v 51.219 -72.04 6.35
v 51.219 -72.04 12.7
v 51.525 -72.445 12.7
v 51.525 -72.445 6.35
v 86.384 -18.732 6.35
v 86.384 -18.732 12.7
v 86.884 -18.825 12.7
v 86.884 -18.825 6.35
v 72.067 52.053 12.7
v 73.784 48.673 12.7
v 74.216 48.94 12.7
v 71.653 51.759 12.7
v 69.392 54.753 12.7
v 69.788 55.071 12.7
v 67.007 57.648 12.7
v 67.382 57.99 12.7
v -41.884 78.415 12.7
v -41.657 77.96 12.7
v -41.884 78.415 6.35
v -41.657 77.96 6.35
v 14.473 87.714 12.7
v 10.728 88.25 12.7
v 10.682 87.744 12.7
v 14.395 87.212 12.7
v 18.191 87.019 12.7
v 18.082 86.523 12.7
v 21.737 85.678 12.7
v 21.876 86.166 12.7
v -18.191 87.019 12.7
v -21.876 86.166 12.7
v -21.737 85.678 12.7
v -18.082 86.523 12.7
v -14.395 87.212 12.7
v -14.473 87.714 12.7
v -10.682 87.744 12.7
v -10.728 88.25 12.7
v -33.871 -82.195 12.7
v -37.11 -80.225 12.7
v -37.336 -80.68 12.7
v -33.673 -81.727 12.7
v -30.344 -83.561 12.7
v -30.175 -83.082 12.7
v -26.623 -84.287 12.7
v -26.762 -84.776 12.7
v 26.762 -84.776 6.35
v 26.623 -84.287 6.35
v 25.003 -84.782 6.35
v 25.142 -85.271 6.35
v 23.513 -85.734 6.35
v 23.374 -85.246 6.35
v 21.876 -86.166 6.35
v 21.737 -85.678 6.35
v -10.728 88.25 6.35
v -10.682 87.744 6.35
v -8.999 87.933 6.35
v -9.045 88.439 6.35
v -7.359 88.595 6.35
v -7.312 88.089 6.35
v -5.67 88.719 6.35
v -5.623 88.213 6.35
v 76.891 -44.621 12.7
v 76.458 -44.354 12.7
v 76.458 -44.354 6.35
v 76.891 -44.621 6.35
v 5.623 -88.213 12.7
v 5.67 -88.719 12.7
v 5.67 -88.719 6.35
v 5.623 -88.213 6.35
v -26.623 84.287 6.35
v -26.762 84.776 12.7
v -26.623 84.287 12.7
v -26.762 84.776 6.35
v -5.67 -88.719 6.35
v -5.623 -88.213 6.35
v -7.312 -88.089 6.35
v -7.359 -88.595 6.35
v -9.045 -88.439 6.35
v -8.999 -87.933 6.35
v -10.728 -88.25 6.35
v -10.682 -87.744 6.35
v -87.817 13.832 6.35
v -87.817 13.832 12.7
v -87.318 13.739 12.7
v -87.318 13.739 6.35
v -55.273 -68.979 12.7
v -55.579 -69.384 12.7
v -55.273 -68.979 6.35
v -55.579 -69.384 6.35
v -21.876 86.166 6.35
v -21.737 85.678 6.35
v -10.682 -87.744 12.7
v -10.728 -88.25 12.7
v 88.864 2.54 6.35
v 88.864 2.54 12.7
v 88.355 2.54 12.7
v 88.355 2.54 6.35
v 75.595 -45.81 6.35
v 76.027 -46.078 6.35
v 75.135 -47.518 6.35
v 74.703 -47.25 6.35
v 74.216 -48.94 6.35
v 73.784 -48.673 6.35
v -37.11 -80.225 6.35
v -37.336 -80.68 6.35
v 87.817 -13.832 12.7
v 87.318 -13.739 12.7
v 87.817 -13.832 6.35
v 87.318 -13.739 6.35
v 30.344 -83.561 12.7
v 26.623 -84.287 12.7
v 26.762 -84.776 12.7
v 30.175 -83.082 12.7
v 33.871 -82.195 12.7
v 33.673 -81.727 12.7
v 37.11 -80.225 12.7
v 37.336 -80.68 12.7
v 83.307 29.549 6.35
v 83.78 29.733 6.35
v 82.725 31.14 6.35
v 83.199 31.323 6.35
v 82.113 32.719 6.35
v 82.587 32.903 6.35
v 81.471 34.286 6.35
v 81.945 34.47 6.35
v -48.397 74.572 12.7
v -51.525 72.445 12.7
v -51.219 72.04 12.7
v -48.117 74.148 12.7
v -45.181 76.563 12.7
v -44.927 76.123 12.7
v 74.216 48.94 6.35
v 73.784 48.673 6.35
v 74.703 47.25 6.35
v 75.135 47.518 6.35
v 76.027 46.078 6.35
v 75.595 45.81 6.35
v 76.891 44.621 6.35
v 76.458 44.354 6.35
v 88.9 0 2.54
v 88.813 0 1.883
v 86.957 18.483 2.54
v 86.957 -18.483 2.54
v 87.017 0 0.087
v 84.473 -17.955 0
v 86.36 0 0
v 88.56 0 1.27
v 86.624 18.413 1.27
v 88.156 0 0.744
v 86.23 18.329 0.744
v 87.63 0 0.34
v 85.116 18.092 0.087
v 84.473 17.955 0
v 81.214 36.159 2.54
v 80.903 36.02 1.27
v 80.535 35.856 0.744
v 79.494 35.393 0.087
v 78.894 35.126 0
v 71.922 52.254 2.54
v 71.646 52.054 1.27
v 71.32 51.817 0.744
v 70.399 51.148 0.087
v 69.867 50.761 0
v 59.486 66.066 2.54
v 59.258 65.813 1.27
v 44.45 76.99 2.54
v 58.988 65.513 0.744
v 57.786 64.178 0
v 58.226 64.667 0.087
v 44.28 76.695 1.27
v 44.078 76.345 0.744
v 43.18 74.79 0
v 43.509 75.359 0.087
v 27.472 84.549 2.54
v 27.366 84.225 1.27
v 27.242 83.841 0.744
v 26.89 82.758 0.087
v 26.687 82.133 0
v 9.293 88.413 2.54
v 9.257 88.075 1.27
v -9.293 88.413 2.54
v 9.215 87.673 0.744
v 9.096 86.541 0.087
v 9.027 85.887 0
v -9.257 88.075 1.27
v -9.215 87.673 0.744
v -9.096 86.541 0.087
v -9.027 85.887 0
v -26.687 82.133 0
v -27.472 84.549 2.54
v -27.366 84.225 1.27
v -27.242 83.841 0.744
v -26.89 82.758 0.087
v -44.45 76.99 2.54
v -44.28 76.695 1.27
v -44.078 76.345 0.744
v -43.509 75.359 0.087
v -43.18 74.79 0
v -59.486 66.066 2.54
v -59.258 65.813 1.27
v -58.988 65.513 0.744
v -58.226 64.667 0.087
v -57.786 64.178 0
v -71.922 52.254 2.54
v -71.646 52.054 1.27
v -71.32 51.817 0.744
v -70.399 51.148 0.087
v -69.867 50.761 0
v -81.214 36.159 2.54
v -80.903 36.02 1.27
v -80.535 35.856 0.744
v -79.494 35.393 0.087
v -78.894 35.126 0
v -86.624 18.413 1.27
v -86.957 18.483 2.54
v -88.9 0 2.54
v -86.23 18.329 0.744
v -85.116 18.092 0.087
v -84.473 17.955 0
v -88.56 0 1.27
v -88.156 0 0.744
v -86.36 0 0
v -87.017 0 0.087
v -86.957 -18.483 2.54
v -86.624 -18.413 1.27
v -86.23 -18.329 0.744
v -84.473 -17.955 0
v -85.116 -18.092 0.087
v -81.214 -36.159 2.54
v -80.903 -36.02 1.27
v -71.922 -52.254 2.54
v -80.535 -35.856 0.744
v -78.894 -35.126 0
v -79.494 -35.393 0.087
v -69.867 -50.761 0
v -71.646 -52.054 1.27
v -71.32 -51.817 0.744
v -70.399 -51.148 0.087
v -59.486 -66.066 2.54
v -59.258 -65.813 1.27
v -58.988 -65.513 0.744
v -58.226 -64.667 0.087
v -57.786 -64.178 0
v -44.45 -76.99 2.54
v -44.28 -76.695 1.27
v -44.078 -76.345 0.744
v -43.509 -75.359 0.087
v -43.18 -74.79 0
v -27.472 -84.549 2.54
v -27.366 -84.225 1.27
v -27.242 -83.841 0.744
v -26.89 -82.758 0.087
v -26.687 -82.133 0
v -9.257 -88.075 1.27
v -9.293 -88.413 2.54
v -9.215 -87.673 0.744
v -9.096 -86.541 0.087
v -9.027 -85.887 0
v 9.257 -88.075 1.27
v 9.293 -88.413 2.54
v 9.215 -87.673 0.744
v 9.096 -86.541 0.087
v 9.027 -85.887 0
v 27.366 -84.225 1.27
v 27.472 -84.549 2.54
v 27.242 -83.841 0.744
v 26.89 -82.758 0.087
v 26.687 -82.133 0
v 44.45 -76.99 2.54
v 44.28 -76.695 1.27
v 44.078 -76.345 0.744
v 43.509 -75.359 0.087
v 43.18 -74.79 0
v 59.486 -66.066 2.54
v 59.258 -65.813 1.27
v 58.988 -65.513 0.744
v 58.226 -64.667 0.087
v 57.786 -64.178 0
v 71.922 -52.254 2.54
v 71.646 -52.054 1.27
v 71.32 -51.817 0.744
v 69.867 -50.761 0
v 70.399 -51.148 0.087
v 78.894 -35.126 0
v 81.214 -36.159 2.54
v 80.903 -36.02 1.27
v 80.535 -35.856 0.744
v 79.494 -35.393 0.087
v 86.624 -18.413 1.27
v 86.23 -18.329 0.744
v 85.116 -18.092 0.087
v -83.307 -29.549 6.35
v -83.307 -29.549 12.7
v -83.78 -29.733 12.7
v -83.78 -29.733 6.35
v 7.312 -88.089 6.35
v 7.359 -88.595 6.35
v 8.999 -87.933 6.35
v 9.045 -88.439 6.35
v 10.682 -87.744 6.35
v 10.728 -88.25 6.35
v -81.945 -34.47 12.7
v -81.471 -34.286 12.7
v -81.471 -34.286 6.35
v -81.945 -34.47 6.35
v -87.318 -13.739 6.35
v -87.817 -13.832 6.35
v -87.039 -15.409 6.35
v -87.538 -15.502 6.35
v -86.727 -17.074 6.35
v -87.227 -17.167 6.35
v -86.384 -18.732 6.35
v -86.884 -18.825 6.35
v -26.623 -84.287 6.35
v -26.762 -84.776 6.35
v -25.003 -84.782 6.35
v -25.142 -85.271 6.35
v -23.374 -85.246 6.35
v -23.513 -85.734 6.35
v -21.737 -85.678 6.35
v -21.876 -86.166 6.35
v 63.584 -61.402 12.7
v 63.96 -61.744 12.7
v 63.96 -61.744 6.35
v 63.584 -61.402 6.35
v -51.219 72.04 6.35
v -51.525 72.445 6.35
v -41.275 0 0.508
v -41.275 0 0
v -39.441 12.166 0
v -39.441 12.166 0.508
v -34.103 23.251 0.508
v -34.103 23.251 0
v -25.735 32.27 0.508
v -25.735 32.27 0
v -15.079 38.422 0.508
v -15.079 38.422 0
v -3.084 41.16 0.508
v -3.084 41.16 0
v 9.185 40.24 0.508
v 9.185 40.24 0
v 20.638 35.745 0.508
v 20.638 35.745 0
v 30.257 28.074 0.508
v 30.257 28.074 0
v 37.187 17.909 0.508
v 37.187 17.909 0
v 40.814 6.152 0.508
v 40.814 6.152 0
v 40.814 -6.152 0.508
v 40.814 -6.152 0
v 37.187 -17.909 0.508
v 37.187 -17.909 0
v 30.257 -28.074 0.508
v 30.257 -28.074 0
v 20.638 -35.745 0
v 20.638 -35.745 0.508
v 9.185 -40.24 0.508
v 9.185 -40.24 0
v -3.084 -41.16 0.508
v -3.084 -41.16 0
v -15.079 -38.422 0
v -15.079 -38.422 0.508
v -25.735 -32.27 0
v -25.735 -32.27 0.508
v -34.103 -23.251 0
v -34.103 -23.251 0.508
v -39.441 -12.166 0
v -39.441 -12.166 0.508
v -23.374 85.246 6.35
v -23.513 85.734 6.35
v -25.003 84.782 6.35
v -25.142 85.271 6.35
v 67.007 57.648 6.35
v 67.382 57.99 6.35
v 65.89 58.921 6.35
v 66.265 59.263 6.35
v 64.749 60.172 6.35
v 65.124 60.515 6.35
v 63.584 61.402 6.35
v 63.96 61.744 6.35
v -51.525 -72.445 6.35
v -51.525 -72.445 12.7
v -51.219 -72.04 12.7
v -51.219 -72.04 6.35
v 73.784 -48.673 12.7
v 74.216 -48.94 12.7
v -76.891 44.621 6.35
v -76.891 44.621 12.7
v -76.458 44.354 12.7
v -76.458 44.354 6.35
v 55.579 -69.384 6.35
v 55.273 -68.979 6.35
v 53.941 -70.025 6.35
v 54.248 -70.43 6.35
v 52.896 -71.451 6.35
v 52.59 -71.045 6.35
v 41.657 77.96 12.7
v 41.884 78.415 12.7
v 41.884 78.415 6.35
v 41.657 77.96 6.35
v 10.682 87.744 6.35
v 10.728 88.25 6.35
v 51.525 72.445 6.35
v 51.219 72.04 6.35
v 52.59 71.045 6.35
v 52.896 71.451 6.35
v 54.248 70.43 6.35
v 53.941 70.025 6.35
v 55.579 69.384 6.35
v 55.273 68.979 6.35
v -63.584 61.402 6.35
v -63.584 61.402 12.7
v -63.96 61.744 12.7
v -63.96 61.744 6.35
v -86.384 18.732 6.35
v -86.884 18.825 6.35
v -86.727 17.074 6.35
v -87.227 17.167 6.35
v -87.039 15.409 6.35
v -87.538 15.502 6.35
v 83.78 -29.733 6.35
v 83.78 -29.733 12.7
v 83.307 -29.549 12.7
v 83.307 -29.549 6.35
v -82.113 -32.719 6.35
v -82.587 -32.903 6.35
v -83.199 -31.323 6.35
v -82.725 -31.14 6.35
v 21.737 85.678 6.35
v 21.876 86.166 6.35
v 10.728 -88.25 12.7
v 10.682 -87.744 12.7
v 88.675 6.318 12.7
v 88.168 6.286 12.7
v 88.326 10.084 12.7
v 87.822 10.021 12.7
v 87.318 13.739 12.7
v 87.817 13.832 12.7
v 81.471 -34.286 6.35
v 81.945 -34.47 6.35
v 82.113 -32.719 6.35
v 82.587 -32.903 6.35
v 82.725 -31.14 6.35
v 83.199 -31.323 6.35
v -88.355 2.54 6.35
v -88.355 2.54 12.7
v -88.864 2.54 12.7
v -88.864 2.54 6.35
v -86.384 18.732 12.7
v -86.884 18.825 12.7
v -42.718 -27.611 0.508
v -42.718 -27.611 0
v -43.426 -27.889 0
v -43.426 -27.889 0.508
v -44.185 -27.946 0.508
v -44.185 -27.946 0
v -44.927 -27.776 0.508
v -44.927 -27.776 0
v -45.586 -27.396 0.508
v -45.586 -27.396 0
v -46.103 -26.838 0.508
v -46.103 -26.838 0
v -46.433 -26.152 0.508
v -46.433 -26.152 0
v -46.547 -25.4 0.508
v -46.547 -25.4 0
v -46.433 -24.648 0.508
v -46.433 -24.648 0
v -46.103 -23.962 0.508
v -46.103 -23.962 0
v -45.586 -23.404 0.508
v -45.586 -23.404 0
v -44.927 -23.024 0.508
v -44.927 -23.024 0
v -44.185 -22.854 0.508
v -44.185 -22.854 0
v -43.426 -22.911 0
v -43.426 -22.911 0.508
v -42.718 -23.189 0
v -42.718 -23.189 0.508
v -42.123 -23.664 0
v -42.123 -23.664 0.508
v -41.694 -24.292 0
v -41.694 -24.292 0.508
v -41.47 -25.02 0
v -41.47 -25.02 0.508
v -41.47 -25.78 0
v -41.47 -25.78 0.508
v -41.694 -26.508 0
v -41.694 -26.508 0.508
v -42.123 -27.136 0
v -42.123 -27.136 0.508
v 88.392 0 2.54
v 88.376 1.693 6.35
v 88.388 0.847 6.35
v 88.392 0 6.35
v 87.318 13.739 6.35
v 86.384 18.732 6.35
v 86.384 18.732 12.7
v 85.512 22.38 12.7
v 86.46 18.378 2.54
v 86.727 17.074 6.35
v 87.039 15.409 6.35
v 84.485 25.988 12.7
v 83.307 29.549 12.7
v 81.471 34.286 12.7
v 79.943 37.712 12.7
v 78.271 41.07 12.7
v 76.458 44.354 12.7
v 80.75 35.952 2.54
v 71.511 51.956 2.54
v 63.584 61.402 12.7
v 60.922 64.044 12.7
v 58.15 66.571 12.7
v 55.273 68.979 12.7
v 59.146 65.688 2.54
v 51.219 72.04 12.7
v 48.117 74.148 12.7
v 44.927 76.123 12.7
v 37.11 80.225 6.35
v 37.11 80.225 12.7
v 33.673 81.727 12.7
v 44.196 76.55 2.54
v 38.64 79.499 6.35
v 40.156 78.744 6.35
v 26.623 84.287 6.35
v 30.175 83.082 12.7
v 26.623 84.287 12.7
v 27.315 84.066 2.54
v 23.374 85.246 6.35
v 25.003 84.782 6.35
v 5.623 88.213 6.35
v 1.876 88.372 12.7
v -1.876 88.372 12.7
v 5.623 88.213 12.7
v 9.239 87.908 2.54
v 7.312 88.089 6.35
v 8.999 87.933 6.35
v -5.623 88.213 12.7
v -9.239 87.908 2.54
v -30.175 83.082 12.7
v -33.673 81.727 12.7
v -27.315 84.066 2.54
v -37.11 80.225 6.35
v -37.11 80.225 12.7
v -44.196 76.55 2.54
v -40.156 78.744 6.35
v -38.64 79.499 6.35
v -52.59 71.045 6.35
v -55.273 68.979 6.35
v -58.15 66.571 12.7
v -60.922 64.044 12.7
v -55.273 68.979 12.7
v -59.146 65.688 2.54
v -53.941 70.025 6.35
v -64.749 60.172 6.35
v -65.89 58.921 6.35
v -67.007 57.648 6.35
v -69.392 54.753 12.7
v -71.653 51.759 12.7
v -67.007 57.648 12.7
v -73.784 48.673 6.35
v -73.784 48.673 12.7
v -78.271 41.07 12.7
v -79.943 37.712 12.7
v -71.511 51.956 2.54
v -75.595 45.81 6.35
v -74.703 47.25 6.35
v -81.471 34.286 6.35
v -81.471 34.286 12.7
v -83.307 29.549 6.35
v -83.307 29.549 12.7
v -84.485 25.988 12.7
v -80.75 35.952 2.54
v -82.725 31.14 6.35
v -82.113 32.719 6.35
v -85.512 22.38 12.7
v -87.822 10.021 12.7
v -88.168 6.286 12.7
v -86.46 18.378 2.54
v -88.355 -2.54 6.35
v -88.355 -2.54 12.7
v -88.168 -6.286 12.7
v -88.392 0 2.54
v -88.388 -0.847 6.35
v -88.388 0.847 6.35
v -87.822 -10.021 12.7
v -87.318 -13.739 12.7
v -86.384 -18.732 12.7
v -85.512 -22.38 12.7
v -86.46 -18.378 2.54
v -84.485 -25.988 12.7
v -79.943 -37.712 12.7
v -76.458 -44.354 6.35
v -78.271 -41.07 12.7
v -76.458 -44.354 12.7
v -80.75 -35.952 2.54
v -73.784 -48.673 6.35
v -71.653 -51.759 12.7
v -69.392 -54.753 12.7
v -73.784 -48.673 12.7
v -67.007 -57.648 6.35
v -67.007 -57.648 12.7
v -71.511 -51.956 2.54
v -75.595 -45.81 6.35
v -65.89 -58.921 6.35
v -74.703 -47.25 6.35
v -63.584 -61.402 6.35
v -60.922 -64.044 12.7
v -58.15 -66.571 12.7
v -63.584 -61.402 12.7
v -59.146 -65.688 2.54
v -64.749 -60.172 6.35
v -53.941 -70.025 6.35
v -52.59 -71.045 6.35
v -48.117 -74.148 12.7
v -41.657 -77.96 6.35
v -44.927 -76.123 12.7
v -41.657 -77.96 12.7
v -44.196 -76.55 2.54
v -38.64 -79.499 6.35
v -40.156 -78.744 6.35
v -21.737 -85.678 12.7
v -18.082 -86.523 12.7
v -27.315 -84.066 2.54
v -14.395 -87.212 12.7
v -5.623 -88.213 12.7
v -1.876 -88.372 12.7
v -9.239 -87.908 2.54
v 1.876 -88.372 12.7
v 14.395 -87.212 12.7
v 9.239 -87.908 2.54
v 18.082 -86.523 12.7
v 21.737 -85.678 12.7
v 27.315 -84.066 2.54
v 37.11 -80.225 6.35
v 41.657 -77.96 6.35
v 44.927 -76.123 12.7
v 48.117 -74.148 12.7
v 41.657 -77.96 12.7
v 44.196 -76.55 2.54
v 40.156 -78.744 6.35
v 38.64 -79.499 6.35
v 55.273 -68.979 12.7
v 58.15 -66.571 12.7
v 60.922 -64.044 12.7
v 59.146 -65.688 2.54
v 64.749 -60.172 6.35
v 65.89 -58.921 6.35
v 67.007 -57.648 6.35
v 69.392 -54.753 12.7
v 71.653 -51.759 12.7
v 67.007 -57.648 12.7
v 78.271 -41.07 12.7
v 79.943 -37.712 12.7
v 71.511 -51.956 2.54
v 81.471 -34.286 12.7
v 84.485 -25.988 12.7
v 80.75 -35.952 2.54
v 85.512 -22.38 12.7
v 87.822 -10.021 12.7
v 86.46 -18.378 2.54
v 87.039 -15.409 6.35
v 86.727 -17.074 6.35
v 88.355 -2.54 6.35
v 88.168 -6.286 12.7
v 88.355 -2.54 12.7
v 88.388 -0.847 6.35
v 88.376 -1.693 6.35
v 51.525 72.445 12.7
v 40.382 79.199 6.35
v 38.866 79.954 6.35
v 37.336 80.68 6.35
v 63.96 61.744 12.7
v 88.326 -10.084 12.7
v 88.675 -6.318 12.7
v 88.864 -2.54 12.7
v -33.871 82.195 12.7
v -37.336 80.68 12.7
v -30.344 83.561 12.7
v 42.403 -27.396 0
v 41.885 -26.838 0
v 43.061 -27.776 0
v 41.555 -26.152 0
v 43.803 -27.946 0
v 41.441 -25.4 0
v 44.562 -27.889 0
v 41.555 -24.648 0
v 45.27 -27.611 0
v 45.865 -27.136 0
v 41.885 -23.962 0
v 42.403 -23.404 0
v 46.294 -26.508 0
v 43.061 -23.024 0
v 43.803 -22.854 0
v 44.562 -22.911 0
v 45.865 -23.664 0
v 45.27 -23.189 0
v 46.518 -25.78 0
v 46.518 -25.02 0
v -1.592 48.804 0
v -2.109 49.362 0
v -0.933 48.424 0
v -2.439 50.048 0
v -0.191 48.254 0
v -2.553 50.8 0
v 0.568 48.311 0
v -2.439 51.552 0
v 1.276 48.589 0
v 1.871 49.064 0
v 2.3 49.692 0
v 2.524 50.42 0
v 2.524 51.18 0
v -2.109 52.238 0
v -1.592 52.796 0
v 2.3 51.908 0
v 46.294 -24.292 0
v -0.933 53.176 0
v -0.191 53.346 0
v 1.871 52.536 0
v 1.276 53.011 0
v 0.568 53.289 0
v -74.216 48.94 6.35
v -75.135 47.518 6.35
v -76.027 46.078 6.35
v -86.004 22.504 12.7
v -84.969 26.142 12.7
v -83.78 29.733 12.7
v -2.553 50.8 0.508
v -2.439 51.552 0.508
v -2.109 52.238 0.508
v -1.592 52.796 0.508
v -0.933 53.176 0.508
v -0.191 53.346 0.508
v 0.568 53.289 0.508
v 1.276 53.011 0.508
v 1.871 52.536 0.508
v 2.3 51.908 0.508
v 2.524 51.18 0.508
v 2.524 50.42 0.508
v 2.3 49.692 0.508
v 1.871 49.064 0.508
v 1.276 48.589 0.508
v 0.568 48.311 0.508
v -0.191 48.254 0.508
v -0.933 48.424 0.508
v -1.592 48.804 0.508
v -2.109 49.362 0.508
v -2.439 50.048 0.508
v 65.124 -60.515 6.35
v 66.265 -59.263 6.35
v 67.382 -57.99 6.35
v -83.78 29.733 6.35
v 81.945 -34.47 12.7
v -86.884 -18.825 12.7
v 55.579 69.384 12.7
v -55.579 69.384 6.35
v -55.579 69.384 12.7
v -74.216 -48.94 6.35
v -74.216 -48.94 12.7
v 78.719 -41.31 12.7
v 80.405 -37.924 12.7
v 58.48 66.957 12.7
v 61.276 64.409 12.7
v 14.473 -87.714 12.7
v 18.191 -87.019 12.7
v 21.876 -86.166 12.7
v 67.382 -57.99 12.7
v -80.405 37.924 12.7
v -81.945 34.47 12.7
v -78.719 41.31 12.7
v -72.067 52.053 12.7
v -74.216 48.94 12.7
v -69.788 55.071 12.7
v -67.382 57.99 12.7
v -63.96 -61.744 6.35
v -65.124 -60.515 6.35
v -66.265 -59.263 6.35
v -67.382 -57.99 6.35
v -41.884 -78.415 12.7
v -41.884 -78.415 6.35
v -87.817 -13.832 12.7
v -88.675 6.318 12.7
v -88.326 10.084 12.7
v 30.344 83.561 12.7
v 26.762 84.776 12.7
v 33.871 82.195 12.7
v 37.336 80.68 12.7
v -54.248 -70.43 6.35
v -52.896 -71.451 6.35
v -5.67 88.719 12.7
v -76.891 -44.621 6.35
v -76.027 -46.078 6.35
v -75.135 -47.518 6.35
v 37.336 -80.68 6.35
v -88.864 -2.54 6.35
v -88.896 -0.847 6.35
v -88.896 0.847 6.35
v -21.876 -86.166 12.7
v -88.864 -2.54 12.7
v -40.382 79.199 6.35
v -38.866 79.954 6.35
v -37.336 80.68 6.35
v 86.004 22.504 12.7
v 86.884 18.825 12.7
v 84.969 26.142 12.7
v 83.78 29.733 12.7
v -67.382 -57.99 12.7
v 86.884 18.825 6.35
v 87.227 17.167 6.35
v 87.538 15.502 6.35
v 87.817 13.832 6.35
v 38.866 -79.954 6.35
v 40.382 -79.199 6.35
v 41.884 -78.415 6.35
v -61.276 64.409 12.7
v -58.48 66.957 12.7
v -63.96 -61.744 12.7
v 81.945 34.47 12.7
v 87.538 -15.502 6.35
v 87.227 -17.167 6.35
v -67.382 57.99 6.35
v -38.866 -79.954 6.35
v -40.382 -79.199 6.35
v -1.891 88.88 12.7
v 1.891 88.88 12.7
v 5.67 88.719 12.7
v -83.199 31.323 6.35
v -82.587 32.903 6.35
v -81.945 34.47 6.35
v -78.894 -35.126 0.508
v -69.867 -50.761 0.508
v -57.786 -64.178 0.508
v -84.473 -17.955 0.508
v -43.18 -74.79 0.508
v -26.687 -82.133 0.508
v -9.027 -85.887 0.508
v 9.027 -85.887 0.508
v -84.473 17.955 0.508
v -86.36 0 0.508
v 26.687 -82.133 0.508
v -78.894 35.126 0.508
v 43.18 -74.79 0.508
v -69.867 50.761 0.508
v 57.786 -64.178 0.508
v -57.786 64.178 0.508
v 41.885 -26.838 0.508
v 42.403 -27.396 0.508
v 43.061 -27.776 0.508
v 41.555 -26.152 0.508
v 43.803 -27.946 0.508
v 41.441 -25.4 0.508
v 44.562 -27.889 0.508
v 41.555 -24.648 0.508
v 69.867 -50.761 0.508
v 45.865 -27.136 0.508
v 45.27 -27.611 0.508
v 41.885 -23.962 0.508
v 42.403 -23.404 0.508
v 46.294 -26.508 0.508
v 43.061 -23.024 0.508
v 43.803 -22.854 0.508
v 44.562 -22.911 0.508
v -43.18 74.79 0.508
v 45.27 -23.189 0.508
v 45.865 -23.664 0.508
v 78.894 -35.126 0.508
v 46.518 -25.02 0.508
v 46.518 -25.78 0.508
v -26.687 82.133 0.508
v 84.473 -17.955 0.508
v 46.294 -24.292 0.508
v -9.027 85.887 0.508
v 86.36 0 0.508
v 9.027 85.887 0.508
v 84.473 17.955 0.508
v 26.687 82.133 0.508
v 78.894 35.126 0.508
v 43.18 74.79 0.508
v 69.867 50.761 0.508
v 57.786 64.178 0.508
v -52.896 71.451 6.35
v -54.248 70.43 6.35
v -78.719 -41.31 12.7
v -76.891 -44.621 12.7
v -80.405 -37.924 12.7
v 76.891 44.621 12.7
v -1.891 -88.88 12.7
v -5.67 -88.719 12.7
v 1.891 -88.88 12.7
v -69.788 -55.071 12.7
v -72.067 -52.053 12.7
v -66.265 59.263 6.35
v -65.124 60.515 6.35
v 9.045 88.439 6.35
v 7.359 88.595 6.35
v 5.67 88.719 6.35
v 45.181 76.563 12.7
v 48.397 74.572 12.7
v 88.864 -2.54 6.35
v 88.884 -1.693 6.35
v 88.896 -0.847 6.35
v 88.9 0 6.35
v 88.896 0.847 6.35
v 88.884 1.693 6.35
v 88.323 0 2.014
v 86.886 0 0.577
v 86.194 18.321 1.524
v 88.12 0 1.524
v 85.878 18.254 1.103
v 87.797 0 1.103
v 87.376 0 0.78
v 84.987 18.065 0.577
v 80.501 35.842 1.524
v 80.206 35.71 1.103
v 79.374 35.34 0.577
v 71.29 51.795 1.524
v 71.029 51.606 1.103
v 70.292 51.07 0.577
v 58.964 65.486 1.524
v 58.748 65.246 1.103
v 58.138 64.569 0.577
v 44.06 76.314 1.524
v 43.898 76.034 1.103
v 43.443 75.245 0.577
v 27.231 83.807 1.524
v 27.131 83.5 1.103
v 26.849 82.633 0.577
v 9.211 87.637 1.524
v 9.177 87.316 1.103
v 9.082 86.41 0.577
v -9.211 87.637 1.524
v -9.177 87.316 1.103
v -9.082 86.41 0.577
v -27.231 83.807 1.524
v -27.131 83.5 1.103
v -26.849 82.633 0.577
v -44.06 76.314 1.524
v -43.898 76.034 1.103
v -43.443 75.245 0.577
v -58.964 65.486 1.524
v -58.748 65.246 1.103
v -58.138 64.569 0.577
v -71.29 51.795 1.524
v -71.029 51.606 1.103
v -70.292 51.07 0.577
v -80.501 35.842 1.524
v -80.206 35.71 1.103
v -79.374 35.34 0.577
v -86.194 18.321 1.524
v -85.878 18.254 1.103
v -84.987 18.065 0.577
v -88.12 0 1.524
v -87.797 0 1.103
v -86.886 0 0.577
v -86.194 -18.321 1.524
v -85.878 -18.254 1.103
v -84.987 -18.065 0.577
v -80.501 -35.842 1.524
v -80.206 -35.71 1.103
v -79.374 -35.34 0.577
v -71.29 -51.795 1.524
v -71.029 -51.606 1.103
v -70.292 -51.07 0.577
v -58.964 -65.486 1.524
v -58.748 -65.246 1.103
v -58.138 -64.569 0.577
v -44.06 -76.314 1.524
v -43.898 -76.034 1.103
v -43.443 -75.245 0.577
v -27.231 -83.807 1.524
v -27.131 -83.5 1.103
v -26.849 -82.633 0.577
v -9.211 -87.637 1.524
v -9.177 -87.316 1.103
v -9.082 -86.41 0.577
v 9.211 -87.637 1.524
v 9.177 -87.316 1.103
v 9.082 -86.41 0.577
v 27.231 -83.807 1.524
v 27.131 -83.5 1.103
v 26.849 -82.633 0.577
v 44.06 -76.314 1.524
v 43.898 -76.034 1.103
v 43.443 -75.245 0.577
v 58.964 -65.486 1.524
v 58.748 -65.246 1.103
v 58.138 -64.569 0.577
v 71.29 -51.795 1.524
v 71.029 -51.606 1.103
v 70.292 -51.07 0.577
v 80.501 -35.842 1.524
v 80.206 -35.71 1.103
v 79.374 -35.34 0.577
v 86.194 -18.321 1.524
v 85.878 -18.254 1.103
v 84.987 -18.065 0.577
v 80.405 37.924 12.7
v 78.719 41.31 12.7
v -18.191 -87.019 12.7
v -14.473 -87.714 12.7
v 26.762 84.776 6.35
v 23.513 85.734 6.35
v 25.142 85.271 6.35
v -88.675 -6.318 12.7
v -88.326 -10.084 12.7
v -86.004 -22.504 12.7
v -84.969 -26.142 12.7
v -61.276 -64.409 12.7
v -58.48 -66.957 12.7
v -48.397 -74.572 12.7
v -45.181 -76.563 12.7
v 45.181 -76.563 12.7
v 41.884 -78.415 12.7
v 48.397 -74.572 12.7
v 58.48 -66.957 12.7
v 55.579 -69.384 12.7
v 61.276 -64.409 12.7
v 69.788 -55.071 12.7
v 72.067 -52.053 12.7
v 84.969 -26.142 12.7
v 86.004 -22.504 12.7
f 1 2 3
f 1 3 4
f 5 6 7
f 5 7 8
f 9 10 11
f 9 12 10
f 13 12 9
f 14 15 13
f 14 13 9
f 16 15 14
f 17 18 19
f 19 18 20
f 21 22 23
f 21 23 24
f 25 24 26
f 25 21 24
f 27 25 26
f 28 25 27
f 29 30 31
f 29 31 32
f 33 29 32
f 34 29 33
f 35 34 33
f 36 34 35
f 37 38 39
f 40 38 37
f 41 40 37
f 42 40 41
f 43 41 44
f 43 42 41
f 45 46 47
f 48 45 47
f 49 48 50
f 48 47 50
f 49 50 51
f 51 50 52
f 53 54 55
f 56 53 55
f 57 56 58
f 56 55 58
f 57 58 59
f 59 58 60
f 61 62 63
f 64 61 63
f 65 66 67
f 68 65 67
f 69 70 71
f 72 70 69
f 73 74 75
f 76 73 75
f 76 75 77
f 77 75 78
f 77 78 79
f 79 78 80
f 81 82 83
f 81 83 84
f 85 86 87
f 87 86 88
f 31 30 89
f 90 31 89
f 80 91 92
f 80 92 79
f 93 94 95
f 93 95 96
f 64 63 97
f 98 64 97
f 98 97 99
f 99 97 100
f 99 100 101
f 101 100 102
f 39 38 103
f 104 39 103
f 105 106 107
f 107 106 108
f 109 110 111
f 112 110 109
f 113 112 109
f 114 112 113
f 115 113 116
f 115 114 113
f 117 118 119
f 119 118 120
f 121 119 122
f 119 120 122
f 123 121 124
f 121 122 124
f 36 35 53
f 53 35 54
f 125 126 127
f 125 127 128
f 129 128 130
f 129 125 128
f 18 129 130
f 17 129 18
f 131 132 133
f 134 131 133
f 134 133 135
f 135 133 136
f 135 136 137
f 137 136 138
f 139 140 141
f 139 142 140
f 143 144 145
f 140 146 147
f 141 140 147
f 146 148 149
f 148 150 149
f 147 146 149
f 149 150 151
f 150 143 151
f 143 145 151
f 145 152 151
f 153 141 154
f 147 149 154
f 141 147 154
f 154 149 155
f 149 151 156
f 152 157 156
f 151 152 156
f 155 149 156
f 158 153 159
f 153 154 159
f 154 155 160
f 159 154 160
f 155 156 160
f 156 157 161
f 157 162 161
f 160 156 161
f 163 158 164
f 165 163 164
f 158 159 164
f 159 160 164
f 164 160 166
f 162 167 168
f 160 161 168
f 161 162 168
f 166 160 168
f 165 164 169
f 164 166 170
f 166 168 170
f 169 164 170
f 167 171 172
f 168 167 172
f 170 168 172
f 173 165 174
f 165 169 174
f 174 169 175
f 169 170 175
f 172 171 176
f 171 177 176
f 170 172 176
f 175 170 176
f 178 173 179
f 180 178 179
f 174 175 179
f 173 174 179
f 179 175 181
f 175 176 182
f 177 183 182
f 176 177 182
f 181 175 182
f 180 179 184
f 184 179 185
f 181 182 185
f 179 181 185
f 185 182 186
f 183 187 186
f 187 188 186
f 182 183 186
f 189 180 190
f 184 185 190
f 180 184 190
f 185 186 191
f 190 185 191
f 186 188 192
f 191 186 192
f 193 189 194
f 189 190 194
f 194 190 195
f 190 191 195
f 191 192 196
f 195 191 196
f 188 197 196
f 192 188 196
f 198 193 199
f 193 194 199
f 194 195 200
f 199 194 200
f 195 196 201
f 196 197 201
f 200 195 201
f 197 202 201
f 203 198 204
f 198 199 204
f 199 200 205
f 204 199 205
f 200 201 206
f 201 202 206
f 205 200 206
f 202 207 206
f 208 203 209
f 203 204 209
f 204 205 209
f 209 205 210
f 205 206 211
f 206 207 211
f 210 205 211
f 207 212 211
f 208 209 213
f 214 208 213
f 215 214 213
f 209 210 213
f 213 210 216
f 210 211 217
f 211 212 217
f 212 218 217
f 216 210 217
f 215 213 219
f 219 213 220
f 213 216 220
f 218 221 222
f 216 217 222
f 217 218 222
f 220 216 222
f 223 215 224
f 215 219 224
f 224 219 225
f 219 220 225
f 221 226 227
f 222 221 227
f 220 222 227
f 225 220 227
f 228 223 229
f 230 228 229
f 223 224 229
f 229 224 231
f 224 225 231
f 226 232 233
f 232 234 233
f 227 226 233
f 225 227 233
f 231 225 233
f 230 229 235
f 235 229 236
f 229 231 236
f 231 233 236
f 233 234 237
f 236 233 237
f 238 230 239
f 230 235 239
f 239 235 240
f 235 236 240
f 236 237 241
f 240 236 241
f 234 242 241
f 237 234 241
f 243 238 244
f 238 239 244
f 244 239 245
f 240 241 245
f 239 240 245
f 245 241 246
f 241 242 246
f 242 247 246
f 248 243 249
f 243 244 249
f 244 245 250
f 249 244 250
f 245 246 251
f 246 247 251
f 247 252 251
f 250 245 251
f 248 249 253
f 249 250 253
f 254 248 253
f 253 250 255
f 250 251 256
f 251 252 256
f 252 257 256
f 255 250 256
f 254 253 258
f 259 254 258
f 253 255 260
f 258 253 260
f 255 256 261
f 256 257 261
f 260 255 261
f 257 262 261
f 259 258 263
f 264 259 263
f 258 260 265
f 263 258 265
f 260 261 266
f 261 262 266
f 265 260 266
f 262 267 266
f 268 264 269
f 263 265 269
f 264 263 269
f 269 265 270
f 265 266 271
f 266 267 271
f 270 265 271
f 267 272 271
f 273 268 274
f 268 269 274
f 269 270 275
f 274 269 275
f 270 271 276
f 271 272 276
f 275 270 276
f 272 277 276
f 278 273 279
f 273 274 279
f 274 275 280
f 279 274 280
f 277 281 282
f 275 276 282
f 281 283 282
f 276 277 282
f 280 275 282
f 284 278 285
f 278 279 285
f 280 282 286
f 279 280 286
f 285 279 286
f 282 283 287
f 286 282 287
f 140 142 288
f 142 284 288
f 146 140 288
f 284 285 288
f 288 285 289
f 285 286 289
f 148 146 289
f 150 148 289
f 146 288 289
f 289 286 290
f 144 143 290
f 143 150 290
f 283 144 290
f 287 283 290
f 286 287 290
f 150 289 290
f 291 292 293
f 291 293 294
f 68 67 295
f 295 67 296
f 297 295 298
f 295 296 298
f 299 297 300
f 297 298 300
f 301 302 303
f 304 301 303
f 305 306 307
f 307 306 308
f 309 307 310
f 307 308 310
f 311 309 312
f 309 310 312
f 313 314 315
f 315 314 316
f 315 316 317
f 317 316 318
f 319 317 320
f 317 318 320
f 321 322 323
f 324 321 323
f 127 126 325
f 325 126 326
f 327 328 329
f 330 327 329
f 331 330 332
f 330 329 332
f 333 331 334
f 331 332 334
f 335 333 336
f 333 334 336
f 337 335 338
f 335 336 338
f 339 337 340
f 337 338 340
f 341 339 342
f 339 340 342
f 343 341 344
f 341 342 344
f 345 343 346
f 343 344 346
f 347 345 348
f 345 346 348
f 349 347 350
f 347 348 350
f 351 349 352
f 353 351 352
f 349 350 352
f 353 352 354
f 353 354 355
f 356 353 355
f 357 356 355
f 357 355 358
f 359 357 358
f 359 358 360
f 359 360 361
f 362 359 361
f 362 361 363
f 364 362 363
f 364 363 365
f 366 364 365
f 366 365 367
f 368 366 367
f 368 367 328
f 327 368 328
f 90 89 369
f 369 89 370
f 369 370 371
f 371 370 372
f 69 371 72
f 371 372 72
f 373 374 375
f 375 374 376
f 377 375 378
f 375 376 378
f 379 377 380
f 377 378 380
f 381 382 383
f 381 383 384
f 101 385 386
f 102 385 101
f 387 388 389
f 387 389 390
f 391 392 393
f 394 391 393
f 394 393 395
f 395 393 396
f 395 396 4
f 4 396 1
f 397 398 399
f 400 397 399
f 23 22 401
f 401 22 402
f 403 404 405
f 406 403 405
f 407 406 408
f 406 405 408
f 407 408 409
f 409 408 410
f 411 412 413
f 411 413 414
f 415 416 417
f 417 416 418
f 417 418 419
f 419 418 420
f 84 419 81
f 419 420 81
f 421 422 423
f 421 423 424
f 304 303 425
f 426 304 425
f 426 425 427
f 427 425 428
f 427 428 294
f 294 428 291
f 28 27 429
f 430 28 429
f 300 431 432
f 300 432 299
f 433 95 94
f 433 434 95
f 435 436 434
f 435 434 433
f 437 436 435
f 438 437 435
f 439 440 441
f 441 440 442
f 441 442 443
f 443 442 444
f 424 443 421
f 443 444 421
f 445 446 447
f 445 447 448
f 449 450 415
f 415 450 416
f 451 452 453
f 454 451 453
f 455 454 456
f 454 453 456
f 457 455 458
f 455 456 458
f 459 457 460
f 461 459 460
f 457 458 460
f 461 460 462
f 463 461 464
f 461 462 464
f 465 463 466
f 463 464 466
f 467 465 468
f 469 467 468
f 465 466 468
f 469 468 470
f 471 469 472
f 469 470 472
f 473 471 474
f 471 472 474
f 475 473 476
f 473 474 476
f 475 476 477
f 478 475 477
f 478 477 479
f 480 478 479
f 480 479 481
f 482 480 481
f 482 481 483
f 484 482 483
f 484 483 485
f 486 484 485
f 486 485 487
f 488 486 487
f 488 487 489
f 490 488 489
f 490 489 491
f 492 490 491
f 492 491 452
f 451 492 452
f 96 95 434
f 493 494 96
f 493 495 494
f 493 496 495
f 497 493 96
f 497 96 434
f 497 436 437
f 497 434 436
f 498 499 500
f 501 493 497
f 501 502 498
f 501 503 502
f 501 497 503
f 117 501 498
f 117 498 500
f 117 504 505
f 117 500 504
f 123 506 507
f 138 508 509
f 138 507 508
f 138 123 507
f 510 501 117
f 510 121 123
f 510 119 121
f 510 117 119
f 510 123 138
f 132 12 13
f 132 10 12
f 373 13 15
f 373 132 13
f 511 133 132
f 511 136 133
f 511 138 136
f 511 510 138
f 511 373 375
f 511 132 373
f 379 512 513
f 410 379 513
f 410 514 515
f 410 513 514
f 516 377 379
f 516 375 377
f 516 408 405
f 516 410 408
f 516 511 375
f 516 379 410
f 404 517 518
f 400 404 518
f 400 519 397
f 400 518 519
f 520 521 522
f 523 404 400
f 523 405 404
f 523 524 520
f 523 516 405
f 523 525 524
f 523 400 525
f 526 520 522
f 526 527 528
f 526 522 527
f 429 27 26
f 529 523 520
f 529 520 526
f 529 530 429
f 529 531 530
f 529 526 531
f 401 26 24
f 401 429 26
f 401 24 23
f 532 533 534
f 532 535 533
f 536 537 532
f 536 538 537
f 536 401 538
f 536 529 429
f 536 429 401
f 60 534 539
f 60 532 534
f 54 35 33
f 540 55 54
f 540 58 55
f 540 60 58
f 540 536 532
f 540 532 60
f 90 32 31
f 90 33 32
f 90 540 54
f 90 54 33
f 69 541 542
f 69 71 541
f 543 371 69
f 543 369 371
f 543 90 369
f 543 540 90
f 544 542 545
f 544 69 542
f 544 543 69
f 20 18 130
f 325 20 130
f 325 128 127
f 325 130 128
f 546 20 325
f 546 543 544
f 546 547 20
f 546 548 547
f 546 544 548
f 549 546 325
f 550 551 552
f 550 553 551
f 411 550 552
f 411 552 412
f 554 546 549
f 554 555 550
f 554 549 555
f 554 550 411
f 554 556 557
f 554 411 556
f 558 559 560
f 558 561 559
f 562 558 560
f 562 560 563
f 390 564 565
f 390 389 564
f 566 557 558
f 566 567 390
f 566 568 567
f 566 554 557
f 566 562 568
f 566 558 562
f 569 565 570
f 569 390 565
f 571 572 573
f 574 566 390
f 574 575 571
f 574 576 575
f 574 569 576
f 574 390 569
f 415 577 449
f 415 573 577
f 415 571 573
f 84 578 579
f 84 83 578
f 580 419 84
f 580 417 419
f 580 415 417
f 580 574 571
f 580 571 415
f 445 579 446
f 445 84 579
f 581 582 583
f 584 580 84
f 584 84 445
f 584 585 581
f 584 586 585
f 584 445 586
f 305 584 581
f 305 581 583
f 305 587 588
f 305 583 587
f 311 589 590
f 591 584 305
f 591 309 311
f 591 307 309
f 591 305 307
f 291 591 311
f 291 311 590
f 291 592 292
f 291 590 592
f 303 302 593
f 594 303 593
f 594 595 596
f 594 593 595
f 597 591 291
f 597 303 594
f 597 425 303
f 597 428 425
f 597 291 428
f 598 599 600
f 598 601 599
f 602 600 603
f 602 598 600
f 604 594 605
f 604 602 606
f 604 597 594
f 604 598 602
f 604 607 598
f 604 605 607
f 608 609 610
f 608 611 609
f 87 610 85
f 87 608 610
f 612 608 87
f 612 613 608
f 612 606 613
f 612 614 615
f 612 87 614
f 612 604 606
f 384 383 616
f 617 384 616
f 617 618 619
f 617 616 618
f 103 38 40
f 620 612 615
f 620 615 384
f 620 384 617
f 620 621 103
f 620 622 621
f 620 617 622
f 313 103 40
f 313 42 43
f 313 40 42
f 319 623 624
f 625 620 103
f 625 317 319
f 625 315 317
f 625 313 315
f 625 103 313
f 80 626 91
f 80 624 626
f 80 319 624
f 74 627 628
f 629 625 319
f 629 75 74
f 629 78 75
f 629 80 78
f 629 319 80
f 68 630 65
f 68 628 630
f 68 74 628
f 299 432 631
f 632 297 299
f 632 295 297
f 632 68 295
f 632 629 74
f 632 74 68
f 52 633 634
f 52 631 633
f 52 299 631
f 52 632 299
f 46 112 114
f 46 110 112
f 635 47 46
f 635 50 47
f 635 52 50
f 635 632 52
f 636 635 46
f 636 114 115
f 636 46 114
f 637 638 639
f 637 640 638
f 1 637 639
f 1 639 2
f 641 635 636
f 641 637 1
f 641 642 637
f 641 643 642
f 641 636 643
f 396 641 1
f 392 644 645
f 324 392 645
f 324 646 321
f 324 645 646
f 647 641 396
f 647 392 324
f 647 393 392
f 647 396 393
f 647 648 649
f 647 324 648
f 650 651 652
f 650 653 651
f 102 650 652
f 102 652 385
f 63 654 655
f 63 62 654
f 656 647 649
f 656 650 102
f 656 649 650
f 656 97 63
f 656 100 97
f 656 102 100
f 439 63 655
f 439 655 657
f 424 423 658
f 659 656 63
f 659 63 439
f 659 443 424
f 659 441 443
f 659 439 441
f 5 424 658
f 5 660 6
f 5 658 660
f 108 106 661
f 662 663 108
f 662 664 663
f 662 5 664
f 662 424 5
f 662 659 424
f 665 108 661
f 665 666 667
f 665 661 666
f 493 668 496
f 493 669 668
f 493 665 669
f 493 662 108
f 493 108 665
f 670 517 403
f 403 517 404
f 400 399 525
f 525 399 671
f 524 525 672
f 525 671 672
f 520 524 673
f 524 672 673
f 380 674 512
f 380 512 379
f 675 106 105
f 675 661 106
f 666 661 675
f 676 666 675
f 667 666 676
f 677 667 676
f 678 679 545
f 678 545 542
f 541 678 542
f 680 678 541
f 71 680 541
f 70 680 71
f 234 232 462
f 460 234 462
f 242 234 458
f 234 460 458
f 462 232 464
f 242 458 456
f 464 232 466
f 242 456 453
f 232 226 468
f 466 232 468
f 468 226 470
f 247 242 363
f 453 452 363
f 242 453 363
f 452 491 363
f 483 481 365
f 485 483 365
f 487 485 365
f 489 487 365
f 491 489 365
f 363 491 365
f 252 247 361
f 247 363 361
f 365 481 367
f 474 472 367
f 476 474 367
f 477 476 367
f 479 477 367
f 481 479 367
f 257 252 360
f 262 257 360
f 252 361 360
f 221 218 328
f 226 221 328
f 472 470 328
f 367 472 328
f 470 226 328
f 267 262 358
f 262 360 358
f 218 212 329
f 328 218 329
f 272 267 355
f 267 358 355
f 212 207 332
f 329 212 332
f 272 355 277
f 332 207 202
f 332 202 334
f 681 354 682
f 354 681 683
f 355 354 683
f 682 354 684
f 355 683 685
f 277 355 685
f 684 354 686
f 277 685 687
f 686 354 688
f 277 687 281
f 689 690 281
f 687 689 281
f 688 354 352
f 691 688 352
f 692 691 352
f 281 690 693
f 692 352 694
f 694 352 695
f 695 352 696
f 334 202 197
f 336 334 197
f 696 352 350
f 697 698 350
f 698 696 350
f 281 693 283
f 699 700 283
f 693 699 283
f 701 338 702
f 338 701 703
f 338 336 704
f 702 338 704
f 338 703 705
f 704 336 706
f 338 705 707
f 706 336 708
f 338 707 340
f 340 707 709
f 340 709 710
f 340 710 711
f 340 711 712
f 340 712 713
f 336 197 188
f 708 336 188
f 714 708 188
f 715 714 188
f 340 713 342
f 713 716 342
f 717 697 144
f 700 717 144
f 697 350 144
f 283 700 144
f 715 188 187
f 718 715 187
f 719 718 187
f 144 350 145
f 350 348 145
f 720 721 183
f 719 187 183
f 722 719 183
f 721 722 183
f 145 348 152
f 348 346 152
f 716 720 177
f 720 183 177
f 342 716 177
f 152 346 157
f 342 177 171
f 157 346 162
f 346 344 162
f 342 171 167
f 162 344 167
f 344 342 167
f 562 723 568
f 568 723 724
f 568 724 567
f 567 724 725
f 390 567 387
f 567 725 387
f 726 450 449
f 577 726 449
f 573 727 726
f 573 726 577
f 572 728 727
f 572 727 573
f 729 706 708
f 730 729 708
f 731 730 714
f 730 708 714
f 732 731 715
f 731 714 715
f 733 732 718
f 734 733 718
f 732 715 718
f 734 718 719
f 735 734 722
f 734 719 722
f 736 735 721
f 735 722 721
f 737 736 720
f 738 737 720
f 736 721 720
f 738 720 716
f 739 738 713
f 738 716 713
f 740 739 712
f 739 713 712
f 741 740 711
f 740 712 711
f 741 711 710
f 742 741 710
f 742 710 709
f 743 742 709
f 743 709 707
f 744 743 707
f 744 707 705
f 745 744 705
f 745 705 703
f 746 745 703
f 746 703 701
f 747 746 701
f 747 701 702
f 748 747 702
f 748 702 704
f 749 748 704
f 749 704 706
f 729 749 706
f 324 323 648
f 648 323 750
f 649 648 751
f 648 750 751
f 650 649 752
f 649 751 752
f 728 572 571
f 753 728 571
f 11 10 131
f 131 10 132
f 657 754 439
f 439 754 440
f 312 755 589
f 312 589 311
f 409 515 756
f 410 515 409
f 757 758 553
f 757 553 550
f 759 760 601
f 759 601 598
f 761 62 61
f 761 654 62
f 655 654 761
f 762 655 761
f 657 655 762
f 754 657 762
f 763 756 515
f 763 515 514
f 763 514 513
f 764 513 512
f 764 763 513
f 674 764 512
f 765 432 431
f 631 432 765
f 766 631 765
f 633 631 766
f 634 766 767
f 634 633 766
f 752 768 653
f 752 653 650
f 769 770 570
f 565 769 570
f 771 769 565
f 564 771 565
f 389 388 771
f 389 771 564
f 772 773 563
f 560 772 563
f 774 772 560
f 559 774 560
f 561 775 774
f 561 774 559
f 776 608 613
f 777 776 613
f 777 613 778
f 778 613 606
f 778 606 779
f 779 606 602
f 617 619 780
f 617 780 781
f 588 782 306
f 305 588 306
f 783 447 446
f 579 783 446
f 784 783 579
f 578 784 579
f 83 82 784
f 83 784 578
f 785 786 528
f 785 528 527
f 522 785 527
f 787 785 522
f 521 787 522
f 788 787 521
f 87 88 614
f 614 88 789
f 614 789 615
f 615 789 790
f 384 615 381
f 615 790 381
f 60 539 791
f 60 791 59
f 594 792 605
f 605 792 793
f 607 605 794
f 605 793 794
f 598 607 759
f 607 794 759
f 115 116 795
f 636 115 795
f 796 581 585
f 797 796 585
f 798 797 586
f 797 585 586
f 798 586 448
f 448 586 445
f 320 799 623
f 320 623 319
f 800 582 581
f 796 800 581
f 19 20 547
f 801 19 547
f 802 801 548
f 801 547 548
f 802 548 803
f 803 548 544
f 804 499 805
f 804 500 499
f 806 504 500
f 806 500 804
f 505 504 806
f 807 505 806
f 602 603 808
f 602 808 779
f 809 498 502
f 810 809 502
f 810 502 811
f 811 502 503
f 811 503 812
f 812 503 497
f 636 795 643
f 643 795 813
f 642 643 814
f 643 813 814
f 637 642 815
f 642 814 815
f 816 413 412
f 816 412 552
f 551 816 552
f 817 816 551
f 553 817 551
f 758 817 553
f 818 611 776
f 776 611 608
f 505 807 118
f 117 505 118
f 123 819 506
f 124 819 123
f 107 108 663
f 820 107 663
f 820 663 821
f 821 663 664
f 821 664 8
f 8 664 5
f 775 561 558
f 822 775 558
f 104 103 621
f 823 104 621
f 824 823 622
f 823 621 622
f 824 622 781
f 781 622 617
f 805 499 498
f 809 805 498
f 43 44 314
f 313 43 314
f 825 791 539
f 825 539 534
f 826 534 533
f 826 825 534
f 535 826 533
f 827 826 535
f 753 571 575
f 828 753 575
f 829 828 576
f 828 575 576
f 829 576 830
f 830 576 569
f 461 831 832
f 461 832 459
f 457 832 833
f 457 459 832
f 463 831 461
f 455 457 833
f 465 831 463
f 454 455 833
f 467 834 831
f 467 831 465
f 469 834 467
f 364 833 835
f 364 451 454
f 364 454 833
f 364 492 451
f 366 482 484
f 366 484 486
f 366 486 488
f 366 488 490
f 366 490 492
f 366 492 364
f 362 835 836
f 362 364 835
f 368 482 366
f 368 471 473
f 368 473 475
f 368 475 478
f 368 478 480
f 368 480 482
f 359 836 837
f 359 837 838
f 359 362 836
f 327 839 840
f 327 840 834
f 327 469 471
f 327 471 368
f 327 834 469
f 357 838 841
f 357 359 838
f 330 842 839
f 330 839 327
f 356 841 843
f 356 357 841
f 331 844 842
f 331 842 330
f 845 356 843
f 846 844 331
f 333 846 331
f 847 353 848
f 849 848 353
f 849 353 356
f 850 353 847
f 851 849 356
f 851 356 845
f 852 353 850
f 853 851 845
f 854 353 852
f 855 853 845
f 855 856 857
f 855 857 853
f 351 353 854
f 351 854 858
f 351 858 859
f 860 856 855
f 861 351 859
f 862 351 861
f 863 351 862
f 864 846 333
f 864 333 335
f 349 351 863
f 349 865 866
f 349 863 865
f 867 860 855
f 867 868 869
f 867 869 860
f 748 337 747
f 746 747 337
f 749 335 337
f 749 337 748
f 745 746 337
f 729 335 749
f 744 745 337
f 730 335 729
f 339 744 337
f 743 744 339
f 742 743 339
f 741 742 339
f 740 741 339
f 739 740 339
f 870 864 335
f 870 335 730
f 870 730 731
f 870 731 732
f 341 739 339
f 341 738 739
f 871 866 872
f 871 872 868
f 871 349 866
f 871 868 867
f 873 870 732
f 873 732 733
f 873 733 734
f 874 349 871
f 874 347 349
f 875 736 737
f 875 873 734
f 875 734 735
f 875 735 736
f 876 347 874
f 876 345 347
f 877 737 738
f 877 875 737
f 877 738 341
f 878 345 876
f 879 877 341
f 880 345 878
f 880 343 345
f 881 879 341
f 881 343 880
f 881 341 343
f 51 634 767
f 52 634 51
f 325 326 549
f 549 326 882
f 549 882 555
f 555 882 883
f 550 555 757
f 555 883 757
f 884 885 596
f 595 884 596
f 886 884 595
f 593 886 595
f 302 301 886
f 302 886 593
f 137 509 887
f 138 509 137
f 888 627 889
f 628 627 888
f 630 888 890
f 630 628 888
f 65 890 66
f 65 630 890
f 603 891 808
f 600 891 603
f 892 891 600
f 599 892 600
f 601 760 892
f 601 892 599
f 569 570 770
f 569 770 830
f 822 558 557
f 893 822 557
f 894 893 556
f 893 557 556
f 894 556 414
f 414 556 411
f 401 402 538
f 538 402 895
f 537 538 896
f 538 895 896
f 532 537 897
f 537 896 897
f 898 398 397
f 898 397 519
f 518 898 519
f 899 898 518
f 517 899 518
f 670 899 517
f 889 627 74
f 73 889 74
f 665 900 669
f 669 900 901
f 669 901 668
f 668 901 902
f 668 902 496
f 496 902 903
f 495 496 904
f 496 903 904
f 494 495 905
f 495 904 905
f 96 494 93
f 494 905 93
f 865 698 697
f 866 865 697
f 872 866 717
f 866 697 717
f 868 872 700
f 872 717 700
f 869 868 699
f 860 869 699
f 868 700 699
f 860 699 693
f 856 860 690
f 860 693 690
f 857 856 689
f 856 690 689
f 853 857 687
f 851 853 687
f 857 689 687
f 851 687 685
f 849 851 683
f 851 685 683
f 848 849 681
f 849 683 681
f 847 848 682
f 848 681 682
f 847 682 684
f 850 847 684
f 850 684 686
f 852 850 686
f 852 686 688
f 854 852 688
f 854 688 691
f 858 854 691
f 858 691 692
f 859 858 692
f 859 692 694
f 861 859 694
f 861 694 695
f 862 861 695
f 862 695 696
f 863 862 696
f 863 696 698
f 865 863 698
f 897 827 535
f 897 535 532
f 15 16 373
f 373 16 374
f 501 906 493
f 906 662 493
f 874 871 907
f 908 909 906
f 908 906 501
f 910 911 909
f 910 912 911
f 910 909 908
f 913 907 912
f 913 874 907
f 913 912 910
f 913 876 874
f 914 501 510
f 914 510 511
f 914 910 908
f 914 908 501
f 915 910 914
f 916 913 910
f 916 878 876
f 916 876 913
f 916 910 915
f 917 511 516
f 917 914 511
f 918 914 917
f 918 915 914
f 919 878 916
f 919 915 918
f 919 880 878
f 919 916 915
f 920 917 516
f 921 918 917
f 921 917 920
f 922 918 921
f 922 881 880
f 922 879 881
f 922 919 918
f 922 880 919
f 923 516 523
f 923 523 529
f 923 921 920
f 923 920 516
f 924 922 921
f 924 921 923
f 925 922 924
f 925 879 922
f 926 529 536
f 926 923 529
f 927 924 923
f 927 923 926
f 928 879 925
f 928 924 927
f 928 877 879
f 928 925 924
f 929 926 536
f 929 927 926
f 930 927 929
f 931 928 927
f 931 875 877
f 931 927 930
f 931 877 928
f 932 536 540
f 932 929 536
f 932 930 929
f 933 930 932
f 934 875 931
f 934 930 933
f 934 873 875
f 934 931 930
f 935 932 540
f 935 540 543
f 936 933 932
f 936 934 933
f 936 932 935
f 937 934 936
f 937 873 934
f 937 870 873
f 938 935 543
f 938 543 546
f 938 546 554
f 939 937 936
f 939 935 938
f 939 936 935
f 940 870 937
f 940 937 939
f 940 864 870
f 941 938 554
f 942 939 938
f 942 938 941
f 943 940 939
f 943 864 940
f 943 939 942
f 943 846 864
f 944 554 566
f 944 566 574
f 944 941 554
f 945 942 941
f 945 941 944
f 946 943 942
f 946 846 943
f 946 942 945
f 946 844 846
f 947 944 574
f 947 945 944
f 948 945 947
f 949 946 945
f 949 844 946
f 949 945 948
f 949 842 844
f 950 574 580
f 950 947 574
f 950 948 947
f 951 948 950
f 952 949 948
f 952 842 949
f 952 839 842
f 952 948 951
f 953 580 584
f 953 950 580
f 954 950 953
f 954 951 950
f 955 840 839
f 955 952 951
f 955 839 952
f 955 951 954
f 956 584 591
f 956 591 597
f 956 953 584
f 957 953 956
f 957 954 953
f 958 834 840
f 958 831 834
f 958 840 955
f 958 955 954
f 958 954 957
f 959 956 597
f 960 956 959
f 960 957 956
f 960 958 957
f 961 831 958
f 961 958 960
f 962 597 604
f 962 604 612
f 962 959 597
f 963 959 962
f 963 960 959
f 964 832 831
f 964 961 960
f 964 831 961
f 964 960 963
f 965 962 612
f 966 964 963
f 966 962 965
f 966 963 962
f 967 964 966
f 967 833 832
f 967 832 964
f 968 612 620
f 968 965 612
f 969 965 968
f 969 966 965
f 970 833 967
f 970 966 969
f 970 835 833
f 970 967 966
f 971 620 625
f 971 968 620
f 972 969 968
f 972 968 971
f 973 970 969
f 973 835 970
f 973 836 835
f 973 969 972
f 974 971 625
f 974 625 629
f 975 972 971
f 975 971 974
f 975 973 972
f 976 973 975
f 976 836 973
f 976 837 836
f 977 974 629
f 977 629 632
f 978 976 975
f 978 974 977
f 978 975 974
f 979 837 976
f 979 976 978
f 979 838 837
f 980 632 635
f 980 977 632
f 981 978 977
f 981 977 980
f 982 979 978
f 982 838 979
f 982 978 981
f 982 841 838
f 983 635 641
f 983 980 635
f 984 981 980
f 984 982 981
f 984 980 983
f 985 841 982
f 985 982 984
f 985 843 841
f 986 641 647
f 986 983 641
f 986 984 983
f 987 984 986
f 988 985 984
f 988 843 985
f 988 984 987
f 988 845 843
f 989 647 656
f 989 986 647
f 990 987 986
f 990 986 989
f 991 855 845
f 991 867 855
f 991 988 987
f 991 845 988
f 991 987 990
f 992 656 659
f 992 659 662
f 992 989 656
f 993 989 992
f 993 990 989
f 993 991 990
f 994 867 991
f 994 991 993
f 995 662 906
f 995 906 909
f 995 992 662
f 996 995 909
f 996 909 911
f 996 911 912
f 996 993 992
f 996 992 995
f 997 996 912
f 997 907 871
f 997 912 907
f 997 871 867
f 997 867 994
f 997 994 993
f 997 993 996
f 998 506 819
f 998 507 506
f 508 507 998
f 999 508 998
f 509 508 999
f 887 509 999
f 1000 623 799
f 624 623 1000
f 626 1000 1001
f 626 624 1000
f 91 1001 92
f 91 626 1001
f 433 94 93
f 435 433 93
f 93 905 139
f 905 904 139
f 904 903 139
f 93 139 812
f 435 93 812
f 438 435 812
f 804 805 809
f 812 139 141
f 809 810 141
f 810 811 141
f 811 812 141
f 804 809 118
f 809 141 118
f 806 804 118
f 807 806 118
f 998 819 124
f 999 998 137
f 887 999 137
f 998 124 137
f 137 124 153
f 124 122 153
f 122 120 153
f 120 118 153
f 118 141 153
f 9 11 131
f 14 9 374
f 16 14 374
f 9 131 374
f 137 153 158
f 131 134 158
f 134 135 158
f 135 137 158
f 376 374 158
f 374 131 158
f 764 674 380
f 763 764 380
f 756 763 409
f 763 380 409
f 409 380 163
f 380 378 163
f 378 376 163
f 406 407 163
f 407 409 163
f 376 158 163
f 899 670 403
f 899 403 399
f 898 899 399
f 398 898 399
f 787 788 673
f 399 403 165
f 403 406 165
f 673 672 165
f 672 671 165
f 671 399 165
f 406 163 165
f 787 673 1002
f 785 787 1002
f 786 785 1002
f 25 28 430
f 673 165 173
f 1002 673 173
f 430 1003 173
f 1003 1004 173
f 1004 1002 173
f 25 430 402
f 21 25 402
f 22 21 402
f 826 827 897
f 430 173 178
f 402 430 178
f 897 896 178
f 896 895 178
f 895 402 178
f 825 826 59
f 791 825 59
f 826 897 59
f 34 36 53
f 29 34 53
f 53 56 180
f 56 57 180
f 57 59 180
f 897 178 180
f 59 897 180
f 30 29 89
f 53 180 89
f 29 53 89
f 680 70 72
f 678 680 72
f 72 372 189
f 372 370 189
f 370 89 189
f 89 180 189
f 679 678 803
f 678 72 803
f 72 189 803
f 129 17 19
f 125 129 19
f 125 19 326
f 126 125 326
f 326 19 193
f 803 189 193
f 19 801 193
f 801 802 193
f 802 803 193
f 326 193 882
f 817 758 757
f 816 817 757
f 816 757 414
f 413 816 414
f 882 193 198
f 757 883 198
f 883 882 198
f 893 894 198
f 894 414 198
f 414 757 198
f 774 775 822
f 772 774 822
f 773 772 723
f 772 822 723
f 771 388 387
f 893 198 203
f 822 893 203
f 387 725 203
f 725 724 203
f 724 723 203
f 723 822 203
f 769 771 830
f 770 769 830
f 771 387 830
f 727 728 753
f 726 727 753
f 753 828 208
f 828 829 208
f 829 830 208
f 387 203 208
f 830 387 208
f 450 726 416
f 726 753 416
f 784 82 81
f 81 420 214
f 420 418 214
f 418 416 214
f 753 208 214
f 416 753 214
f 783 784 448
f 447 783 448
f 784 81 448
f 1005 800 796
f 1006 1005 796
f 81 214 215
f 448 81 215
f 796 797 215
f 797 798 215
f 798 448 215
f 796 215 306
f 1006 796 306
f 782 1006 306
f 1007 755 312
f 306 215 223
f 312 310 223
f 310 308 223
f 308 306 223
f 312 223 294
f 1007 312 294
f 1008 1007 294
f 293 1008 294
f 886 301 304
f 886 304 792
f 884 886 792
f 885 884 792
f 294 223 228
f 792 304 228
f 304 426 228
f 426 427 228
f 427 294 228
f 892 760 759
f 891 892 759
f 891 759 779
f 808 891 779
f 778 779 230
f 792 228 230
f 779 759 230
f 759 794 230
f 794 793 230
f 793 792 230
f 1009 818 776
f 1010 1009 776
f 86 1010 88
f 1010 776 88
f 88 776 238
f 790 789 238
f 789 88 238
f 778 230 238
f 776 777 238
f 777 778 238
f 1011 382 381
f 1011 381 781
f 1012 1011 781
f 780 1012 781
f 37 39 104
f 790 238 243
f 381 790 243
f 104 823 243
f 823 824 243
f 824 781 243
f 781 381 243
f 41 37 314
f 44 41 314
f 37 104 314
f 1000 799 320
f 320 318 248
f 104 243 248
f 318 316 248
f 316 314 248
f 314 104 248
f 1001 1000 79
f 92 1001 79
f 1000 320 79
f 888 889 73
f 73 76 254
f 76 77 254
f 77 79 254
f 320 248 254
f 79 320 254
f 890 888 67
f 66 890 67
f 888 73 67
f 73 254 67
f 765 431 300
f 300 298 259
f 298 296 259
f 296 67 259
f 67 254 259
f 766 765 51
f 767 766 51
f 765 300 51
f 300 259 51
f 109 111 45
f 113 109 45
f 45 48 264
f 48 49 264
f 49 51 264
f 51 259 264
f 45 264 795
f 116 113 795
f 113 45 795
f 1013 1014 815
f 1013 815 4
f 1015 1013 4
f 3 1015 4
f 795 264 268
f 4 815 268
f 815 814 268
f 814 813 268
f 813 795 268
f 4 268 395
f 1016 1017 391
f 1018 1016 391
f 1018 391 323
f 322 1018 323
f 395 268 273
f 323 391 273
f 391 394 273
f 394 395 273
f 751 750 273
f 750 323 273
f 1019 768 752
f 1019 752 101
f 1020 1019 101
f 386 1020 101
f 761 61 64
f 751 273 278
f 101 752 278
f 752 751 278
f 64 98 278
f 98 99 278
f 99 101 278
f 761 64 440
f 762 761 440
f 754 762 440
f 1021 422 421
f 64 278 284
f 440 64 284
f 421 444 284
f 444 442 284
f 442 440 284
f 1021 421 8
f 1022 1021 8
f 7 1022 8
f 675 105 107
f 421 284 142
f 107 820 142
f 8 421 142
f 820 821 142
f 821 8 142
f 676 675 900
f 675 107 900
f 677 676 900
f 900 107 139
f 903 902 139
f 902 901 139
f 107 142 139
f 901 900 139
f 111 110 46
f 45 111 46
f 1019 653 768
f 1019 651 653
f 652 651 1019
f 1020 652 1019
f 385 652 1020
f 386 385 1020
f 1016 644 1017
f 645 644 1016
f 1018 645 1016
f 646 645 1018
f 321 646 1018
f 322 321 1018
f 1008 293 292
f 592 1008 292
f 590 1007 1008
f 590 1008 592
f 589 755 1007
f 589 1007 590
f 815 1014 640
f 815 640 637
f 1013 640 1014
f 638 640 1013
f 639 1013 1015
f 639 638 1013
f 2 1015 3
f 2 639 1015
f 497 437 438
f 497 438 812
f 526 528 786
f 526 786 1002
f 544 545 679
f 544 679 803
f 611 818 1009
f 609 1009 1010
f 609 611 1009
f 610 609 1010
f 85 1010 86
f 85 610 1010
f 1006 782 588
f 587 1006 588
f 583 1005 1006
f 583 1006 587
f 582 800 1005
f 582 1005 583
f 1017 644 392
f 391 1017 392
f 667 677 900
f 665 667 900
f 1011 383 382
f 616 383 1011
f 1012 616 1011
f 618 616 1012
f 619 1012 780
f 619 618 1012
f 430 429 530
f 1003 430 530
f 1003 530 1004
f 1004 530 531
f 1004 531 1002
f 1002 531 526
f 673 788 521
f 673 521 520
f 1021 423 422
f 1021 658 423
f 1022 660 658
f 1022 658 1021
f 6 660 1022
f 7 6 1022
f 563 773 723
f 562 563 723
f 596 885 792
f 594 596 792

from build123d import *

# Parameters (mm, degrees)
SKETCH1_R                  = 88.9
EXTRUDE1_DEPTH             = 12.7
FILLET1_R                  = 2.54
SHELL1_T                   = -0.508
F_1_1_DIAMETER_HOLE1_D     = 82.55
F_1_1_DIAMETER_HOLE1_DEPTH = 17.78
F_1_1_DIAMETER_HOLE1_TIP   = 24.80052205
SKETCH3_W                  = 6.35
SKETCH3_H                  = 5.08
EXTRUDE2_DEPTH             = 127.363404513
CIRPATTERN1_COUNT          = 17
F_10_CLEARANCE_HOLE1_D     = 5.1054
CIRPATTERN2_COUNT          = 3


with BuildPart() as part:
    # Sketch1 → Extrude1 (new body)
    with BuildSketch(Plane.XY):
        Circle(SKETCH1_R)
    extrude(amount=EXTRUDE1_DEPTH)

    # Fillet1
    fillet1_edges = [part.edges().sort_by_distance(p)[0] for p in [
        (-88.9, 0, 0),
    ]]
    fillet(fillet1_edges, radius=FILLET1_R)

    # Shell1
    shell1_openings = [part.faces().sort_by_distance(p)[0] for p in [
        (0, 0, 12.7),
    ]]
    offset(amount=SHELL1_T, openings=shell1_openings, kind=Kind.INTERSECTION)

    # 1 (1) Diameter Hole1
    with Locations(Plane.XY.offset(0.508)):
        with Locations((0, 0)):
            Hole(F_1_1_DIAMETER_HOLE1_D / 2, depth=F_1_1_DIAMETER_HOLE1_DEPTH)
            with Locations((0, 0, -(F_1_1_DIAMETER_HOLE1_DEPTH + F_1_1_DIAMETER_HOLE1_TIP / 2))):  # 118° drill point
                Cone(0, F_1_1_DIAMETER_HOLE1_D / 2, F_1_1_DIAMETER_HOLE1_TIP, mode=Mode.SUBTRACT)

    # Sketch3 → Extrude2 (cut, symmetric)
    with BuildSketch(Plane(origin=(0, 0, 0), x_dir=(0, 0, -1), z_dir=(1, 0, 0))):
        with Locations((-9.525, 0)):
            Rectangle(SKETCH3_W, SKETCH3_H)
    extrude2 = extrude(amount=EXTRUDE2_DEPTH, both=True, mode=Mode.SUBTRACT)

    # CirPattern1: Extrude2 ×17 about axis
    cirpattern1_axis = Axis((0, 0, 0), (0, 0, 1))
    for i in range(1, CIRPATTERN1_COUNT):
        add(extrude2.rotate(cirpattern1_axis, i * 360 / CIRPATTERN1_COUNT), mode=Mode.SUBTRACT)

    # #10 Clearance Hole1 (through all)
    with Locations(Plane(origin=(0, 50.8, 0.508), x_dir=(1, 0, 0), z_dir=(0, 0, 1))):
        with Locations((0, 0)):
            f_10_clearance_hole1 = Hole(F_10_CLEARANCE_HOLE1_D / 2)

    # CirPattern2: #10 Clearance Hole1 ×3 about axis
    cirpattern2_axis = Axis((0, 0, 0), (0, 0, 1))
    for i in range(1, CIRPATTERN2_COUNT):
        add(f_10_clearance_hole1.rotate(cirpattern2_axis, i * 360 / CIRPATTERN2_COUNT), mode=Mode.SUBTRACT)


solid = part.part
